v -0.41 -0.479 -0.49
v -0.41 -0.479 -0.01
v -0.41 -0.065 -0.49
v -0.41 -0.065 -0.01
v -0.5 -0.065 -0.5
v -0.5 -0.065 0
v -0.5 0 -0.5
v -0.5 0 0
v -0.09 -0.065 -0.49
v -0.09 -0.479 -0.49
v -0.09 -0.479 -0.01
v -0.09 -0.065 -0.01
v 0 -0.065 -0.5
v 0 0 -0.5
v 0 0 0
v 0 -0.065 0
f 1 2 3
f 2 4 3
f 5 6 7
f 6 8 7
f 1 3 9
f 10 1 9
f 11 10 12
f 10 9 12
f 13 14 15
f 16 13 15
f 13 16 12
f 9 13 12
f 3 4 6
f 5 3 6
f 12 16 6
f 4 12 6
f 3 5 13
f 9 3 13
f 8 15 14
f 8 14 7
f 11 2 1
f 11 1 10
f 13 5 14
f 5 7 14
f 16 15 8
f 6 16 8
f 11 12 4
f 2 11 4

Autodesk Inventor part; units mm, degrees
ref_plane "YZ Plane" through (0, 0, 0) normal (1, 0, 0) x (0, 1, 0)
ref_plane "XZ Plane" through (0, 0, 0) normal (0, 1, 0) x (-1, 0, 0)
ref_plane "XY Plane" through (0, 0, 0) normal (0, 0, 1) x (1, 0, 0)
sketch "スケッチ1" plane through (0, 0, 0) normal (0, 1, 0) x (-1, 0, 0)
  line L0 (0, 0) -> (0.5, 0)
  line L1 (0.5, 0) -> (0.5, -0.5)
  line L2 (0.5, -0.5) -> (0, -0.5)
  line L3 (0, -0.5) -> (0, 0)
  dimension "d0" = 0.5
  dimension "d1" = 0.5
extrude "押し出し1" add sketch "スケッチ1" against normal blind 0.065
sketch "スケッチ2" plane through (0, -0.065, 0) normal (0, -1, 0) x (1, 0, 0)
  point P0 (0, 0)
sketch "スケッチ3" plane through (0, -0.065, 0) normal (0, -1, 0) x (1, 0, 0)
  line L0 (0, 0) -> (-0.5, 0) projected
  line L1 (-0.5, -0.5) -> (0, -0.5) projected
  line L2 (-0.09, -0.01) -> (-0.41, -0.01)
  line L3 (-0.41, -0.01) -> (-0.41, -0.49)
  line L4 (-0.41, -0.49) -> (-0.09, -0.49)
  line L5 (-0.09, -0.49) -> (-0.09, -0.01)
  point P0 (-0.09, 0)
  point P1 (-0.41, -0.5)
  dimension "d7" = 0.32
  dimension "d8" = 0.48
extrude "押し出し2" add sketch "スケッチ3" along normal blind 0.414
sketch "スケッチ4" plane through (0, 0, 0) normal (1, 0, 0) x (0, 0, -1)
  point P0 (0, 0)
sketch "スケッチ5" plane through (0, -0.065, 0) normal (0, -1, 0) x (1, 0, 0)
  point P0 (0, 0)
sketch "スケッチ6" plane through (-0.41, -0.065, -0.01) normal (0, 0, 1) x (1, 0, 0)
  point P0 (0.41, 0.065)
properties part number "CRANEBASE"
